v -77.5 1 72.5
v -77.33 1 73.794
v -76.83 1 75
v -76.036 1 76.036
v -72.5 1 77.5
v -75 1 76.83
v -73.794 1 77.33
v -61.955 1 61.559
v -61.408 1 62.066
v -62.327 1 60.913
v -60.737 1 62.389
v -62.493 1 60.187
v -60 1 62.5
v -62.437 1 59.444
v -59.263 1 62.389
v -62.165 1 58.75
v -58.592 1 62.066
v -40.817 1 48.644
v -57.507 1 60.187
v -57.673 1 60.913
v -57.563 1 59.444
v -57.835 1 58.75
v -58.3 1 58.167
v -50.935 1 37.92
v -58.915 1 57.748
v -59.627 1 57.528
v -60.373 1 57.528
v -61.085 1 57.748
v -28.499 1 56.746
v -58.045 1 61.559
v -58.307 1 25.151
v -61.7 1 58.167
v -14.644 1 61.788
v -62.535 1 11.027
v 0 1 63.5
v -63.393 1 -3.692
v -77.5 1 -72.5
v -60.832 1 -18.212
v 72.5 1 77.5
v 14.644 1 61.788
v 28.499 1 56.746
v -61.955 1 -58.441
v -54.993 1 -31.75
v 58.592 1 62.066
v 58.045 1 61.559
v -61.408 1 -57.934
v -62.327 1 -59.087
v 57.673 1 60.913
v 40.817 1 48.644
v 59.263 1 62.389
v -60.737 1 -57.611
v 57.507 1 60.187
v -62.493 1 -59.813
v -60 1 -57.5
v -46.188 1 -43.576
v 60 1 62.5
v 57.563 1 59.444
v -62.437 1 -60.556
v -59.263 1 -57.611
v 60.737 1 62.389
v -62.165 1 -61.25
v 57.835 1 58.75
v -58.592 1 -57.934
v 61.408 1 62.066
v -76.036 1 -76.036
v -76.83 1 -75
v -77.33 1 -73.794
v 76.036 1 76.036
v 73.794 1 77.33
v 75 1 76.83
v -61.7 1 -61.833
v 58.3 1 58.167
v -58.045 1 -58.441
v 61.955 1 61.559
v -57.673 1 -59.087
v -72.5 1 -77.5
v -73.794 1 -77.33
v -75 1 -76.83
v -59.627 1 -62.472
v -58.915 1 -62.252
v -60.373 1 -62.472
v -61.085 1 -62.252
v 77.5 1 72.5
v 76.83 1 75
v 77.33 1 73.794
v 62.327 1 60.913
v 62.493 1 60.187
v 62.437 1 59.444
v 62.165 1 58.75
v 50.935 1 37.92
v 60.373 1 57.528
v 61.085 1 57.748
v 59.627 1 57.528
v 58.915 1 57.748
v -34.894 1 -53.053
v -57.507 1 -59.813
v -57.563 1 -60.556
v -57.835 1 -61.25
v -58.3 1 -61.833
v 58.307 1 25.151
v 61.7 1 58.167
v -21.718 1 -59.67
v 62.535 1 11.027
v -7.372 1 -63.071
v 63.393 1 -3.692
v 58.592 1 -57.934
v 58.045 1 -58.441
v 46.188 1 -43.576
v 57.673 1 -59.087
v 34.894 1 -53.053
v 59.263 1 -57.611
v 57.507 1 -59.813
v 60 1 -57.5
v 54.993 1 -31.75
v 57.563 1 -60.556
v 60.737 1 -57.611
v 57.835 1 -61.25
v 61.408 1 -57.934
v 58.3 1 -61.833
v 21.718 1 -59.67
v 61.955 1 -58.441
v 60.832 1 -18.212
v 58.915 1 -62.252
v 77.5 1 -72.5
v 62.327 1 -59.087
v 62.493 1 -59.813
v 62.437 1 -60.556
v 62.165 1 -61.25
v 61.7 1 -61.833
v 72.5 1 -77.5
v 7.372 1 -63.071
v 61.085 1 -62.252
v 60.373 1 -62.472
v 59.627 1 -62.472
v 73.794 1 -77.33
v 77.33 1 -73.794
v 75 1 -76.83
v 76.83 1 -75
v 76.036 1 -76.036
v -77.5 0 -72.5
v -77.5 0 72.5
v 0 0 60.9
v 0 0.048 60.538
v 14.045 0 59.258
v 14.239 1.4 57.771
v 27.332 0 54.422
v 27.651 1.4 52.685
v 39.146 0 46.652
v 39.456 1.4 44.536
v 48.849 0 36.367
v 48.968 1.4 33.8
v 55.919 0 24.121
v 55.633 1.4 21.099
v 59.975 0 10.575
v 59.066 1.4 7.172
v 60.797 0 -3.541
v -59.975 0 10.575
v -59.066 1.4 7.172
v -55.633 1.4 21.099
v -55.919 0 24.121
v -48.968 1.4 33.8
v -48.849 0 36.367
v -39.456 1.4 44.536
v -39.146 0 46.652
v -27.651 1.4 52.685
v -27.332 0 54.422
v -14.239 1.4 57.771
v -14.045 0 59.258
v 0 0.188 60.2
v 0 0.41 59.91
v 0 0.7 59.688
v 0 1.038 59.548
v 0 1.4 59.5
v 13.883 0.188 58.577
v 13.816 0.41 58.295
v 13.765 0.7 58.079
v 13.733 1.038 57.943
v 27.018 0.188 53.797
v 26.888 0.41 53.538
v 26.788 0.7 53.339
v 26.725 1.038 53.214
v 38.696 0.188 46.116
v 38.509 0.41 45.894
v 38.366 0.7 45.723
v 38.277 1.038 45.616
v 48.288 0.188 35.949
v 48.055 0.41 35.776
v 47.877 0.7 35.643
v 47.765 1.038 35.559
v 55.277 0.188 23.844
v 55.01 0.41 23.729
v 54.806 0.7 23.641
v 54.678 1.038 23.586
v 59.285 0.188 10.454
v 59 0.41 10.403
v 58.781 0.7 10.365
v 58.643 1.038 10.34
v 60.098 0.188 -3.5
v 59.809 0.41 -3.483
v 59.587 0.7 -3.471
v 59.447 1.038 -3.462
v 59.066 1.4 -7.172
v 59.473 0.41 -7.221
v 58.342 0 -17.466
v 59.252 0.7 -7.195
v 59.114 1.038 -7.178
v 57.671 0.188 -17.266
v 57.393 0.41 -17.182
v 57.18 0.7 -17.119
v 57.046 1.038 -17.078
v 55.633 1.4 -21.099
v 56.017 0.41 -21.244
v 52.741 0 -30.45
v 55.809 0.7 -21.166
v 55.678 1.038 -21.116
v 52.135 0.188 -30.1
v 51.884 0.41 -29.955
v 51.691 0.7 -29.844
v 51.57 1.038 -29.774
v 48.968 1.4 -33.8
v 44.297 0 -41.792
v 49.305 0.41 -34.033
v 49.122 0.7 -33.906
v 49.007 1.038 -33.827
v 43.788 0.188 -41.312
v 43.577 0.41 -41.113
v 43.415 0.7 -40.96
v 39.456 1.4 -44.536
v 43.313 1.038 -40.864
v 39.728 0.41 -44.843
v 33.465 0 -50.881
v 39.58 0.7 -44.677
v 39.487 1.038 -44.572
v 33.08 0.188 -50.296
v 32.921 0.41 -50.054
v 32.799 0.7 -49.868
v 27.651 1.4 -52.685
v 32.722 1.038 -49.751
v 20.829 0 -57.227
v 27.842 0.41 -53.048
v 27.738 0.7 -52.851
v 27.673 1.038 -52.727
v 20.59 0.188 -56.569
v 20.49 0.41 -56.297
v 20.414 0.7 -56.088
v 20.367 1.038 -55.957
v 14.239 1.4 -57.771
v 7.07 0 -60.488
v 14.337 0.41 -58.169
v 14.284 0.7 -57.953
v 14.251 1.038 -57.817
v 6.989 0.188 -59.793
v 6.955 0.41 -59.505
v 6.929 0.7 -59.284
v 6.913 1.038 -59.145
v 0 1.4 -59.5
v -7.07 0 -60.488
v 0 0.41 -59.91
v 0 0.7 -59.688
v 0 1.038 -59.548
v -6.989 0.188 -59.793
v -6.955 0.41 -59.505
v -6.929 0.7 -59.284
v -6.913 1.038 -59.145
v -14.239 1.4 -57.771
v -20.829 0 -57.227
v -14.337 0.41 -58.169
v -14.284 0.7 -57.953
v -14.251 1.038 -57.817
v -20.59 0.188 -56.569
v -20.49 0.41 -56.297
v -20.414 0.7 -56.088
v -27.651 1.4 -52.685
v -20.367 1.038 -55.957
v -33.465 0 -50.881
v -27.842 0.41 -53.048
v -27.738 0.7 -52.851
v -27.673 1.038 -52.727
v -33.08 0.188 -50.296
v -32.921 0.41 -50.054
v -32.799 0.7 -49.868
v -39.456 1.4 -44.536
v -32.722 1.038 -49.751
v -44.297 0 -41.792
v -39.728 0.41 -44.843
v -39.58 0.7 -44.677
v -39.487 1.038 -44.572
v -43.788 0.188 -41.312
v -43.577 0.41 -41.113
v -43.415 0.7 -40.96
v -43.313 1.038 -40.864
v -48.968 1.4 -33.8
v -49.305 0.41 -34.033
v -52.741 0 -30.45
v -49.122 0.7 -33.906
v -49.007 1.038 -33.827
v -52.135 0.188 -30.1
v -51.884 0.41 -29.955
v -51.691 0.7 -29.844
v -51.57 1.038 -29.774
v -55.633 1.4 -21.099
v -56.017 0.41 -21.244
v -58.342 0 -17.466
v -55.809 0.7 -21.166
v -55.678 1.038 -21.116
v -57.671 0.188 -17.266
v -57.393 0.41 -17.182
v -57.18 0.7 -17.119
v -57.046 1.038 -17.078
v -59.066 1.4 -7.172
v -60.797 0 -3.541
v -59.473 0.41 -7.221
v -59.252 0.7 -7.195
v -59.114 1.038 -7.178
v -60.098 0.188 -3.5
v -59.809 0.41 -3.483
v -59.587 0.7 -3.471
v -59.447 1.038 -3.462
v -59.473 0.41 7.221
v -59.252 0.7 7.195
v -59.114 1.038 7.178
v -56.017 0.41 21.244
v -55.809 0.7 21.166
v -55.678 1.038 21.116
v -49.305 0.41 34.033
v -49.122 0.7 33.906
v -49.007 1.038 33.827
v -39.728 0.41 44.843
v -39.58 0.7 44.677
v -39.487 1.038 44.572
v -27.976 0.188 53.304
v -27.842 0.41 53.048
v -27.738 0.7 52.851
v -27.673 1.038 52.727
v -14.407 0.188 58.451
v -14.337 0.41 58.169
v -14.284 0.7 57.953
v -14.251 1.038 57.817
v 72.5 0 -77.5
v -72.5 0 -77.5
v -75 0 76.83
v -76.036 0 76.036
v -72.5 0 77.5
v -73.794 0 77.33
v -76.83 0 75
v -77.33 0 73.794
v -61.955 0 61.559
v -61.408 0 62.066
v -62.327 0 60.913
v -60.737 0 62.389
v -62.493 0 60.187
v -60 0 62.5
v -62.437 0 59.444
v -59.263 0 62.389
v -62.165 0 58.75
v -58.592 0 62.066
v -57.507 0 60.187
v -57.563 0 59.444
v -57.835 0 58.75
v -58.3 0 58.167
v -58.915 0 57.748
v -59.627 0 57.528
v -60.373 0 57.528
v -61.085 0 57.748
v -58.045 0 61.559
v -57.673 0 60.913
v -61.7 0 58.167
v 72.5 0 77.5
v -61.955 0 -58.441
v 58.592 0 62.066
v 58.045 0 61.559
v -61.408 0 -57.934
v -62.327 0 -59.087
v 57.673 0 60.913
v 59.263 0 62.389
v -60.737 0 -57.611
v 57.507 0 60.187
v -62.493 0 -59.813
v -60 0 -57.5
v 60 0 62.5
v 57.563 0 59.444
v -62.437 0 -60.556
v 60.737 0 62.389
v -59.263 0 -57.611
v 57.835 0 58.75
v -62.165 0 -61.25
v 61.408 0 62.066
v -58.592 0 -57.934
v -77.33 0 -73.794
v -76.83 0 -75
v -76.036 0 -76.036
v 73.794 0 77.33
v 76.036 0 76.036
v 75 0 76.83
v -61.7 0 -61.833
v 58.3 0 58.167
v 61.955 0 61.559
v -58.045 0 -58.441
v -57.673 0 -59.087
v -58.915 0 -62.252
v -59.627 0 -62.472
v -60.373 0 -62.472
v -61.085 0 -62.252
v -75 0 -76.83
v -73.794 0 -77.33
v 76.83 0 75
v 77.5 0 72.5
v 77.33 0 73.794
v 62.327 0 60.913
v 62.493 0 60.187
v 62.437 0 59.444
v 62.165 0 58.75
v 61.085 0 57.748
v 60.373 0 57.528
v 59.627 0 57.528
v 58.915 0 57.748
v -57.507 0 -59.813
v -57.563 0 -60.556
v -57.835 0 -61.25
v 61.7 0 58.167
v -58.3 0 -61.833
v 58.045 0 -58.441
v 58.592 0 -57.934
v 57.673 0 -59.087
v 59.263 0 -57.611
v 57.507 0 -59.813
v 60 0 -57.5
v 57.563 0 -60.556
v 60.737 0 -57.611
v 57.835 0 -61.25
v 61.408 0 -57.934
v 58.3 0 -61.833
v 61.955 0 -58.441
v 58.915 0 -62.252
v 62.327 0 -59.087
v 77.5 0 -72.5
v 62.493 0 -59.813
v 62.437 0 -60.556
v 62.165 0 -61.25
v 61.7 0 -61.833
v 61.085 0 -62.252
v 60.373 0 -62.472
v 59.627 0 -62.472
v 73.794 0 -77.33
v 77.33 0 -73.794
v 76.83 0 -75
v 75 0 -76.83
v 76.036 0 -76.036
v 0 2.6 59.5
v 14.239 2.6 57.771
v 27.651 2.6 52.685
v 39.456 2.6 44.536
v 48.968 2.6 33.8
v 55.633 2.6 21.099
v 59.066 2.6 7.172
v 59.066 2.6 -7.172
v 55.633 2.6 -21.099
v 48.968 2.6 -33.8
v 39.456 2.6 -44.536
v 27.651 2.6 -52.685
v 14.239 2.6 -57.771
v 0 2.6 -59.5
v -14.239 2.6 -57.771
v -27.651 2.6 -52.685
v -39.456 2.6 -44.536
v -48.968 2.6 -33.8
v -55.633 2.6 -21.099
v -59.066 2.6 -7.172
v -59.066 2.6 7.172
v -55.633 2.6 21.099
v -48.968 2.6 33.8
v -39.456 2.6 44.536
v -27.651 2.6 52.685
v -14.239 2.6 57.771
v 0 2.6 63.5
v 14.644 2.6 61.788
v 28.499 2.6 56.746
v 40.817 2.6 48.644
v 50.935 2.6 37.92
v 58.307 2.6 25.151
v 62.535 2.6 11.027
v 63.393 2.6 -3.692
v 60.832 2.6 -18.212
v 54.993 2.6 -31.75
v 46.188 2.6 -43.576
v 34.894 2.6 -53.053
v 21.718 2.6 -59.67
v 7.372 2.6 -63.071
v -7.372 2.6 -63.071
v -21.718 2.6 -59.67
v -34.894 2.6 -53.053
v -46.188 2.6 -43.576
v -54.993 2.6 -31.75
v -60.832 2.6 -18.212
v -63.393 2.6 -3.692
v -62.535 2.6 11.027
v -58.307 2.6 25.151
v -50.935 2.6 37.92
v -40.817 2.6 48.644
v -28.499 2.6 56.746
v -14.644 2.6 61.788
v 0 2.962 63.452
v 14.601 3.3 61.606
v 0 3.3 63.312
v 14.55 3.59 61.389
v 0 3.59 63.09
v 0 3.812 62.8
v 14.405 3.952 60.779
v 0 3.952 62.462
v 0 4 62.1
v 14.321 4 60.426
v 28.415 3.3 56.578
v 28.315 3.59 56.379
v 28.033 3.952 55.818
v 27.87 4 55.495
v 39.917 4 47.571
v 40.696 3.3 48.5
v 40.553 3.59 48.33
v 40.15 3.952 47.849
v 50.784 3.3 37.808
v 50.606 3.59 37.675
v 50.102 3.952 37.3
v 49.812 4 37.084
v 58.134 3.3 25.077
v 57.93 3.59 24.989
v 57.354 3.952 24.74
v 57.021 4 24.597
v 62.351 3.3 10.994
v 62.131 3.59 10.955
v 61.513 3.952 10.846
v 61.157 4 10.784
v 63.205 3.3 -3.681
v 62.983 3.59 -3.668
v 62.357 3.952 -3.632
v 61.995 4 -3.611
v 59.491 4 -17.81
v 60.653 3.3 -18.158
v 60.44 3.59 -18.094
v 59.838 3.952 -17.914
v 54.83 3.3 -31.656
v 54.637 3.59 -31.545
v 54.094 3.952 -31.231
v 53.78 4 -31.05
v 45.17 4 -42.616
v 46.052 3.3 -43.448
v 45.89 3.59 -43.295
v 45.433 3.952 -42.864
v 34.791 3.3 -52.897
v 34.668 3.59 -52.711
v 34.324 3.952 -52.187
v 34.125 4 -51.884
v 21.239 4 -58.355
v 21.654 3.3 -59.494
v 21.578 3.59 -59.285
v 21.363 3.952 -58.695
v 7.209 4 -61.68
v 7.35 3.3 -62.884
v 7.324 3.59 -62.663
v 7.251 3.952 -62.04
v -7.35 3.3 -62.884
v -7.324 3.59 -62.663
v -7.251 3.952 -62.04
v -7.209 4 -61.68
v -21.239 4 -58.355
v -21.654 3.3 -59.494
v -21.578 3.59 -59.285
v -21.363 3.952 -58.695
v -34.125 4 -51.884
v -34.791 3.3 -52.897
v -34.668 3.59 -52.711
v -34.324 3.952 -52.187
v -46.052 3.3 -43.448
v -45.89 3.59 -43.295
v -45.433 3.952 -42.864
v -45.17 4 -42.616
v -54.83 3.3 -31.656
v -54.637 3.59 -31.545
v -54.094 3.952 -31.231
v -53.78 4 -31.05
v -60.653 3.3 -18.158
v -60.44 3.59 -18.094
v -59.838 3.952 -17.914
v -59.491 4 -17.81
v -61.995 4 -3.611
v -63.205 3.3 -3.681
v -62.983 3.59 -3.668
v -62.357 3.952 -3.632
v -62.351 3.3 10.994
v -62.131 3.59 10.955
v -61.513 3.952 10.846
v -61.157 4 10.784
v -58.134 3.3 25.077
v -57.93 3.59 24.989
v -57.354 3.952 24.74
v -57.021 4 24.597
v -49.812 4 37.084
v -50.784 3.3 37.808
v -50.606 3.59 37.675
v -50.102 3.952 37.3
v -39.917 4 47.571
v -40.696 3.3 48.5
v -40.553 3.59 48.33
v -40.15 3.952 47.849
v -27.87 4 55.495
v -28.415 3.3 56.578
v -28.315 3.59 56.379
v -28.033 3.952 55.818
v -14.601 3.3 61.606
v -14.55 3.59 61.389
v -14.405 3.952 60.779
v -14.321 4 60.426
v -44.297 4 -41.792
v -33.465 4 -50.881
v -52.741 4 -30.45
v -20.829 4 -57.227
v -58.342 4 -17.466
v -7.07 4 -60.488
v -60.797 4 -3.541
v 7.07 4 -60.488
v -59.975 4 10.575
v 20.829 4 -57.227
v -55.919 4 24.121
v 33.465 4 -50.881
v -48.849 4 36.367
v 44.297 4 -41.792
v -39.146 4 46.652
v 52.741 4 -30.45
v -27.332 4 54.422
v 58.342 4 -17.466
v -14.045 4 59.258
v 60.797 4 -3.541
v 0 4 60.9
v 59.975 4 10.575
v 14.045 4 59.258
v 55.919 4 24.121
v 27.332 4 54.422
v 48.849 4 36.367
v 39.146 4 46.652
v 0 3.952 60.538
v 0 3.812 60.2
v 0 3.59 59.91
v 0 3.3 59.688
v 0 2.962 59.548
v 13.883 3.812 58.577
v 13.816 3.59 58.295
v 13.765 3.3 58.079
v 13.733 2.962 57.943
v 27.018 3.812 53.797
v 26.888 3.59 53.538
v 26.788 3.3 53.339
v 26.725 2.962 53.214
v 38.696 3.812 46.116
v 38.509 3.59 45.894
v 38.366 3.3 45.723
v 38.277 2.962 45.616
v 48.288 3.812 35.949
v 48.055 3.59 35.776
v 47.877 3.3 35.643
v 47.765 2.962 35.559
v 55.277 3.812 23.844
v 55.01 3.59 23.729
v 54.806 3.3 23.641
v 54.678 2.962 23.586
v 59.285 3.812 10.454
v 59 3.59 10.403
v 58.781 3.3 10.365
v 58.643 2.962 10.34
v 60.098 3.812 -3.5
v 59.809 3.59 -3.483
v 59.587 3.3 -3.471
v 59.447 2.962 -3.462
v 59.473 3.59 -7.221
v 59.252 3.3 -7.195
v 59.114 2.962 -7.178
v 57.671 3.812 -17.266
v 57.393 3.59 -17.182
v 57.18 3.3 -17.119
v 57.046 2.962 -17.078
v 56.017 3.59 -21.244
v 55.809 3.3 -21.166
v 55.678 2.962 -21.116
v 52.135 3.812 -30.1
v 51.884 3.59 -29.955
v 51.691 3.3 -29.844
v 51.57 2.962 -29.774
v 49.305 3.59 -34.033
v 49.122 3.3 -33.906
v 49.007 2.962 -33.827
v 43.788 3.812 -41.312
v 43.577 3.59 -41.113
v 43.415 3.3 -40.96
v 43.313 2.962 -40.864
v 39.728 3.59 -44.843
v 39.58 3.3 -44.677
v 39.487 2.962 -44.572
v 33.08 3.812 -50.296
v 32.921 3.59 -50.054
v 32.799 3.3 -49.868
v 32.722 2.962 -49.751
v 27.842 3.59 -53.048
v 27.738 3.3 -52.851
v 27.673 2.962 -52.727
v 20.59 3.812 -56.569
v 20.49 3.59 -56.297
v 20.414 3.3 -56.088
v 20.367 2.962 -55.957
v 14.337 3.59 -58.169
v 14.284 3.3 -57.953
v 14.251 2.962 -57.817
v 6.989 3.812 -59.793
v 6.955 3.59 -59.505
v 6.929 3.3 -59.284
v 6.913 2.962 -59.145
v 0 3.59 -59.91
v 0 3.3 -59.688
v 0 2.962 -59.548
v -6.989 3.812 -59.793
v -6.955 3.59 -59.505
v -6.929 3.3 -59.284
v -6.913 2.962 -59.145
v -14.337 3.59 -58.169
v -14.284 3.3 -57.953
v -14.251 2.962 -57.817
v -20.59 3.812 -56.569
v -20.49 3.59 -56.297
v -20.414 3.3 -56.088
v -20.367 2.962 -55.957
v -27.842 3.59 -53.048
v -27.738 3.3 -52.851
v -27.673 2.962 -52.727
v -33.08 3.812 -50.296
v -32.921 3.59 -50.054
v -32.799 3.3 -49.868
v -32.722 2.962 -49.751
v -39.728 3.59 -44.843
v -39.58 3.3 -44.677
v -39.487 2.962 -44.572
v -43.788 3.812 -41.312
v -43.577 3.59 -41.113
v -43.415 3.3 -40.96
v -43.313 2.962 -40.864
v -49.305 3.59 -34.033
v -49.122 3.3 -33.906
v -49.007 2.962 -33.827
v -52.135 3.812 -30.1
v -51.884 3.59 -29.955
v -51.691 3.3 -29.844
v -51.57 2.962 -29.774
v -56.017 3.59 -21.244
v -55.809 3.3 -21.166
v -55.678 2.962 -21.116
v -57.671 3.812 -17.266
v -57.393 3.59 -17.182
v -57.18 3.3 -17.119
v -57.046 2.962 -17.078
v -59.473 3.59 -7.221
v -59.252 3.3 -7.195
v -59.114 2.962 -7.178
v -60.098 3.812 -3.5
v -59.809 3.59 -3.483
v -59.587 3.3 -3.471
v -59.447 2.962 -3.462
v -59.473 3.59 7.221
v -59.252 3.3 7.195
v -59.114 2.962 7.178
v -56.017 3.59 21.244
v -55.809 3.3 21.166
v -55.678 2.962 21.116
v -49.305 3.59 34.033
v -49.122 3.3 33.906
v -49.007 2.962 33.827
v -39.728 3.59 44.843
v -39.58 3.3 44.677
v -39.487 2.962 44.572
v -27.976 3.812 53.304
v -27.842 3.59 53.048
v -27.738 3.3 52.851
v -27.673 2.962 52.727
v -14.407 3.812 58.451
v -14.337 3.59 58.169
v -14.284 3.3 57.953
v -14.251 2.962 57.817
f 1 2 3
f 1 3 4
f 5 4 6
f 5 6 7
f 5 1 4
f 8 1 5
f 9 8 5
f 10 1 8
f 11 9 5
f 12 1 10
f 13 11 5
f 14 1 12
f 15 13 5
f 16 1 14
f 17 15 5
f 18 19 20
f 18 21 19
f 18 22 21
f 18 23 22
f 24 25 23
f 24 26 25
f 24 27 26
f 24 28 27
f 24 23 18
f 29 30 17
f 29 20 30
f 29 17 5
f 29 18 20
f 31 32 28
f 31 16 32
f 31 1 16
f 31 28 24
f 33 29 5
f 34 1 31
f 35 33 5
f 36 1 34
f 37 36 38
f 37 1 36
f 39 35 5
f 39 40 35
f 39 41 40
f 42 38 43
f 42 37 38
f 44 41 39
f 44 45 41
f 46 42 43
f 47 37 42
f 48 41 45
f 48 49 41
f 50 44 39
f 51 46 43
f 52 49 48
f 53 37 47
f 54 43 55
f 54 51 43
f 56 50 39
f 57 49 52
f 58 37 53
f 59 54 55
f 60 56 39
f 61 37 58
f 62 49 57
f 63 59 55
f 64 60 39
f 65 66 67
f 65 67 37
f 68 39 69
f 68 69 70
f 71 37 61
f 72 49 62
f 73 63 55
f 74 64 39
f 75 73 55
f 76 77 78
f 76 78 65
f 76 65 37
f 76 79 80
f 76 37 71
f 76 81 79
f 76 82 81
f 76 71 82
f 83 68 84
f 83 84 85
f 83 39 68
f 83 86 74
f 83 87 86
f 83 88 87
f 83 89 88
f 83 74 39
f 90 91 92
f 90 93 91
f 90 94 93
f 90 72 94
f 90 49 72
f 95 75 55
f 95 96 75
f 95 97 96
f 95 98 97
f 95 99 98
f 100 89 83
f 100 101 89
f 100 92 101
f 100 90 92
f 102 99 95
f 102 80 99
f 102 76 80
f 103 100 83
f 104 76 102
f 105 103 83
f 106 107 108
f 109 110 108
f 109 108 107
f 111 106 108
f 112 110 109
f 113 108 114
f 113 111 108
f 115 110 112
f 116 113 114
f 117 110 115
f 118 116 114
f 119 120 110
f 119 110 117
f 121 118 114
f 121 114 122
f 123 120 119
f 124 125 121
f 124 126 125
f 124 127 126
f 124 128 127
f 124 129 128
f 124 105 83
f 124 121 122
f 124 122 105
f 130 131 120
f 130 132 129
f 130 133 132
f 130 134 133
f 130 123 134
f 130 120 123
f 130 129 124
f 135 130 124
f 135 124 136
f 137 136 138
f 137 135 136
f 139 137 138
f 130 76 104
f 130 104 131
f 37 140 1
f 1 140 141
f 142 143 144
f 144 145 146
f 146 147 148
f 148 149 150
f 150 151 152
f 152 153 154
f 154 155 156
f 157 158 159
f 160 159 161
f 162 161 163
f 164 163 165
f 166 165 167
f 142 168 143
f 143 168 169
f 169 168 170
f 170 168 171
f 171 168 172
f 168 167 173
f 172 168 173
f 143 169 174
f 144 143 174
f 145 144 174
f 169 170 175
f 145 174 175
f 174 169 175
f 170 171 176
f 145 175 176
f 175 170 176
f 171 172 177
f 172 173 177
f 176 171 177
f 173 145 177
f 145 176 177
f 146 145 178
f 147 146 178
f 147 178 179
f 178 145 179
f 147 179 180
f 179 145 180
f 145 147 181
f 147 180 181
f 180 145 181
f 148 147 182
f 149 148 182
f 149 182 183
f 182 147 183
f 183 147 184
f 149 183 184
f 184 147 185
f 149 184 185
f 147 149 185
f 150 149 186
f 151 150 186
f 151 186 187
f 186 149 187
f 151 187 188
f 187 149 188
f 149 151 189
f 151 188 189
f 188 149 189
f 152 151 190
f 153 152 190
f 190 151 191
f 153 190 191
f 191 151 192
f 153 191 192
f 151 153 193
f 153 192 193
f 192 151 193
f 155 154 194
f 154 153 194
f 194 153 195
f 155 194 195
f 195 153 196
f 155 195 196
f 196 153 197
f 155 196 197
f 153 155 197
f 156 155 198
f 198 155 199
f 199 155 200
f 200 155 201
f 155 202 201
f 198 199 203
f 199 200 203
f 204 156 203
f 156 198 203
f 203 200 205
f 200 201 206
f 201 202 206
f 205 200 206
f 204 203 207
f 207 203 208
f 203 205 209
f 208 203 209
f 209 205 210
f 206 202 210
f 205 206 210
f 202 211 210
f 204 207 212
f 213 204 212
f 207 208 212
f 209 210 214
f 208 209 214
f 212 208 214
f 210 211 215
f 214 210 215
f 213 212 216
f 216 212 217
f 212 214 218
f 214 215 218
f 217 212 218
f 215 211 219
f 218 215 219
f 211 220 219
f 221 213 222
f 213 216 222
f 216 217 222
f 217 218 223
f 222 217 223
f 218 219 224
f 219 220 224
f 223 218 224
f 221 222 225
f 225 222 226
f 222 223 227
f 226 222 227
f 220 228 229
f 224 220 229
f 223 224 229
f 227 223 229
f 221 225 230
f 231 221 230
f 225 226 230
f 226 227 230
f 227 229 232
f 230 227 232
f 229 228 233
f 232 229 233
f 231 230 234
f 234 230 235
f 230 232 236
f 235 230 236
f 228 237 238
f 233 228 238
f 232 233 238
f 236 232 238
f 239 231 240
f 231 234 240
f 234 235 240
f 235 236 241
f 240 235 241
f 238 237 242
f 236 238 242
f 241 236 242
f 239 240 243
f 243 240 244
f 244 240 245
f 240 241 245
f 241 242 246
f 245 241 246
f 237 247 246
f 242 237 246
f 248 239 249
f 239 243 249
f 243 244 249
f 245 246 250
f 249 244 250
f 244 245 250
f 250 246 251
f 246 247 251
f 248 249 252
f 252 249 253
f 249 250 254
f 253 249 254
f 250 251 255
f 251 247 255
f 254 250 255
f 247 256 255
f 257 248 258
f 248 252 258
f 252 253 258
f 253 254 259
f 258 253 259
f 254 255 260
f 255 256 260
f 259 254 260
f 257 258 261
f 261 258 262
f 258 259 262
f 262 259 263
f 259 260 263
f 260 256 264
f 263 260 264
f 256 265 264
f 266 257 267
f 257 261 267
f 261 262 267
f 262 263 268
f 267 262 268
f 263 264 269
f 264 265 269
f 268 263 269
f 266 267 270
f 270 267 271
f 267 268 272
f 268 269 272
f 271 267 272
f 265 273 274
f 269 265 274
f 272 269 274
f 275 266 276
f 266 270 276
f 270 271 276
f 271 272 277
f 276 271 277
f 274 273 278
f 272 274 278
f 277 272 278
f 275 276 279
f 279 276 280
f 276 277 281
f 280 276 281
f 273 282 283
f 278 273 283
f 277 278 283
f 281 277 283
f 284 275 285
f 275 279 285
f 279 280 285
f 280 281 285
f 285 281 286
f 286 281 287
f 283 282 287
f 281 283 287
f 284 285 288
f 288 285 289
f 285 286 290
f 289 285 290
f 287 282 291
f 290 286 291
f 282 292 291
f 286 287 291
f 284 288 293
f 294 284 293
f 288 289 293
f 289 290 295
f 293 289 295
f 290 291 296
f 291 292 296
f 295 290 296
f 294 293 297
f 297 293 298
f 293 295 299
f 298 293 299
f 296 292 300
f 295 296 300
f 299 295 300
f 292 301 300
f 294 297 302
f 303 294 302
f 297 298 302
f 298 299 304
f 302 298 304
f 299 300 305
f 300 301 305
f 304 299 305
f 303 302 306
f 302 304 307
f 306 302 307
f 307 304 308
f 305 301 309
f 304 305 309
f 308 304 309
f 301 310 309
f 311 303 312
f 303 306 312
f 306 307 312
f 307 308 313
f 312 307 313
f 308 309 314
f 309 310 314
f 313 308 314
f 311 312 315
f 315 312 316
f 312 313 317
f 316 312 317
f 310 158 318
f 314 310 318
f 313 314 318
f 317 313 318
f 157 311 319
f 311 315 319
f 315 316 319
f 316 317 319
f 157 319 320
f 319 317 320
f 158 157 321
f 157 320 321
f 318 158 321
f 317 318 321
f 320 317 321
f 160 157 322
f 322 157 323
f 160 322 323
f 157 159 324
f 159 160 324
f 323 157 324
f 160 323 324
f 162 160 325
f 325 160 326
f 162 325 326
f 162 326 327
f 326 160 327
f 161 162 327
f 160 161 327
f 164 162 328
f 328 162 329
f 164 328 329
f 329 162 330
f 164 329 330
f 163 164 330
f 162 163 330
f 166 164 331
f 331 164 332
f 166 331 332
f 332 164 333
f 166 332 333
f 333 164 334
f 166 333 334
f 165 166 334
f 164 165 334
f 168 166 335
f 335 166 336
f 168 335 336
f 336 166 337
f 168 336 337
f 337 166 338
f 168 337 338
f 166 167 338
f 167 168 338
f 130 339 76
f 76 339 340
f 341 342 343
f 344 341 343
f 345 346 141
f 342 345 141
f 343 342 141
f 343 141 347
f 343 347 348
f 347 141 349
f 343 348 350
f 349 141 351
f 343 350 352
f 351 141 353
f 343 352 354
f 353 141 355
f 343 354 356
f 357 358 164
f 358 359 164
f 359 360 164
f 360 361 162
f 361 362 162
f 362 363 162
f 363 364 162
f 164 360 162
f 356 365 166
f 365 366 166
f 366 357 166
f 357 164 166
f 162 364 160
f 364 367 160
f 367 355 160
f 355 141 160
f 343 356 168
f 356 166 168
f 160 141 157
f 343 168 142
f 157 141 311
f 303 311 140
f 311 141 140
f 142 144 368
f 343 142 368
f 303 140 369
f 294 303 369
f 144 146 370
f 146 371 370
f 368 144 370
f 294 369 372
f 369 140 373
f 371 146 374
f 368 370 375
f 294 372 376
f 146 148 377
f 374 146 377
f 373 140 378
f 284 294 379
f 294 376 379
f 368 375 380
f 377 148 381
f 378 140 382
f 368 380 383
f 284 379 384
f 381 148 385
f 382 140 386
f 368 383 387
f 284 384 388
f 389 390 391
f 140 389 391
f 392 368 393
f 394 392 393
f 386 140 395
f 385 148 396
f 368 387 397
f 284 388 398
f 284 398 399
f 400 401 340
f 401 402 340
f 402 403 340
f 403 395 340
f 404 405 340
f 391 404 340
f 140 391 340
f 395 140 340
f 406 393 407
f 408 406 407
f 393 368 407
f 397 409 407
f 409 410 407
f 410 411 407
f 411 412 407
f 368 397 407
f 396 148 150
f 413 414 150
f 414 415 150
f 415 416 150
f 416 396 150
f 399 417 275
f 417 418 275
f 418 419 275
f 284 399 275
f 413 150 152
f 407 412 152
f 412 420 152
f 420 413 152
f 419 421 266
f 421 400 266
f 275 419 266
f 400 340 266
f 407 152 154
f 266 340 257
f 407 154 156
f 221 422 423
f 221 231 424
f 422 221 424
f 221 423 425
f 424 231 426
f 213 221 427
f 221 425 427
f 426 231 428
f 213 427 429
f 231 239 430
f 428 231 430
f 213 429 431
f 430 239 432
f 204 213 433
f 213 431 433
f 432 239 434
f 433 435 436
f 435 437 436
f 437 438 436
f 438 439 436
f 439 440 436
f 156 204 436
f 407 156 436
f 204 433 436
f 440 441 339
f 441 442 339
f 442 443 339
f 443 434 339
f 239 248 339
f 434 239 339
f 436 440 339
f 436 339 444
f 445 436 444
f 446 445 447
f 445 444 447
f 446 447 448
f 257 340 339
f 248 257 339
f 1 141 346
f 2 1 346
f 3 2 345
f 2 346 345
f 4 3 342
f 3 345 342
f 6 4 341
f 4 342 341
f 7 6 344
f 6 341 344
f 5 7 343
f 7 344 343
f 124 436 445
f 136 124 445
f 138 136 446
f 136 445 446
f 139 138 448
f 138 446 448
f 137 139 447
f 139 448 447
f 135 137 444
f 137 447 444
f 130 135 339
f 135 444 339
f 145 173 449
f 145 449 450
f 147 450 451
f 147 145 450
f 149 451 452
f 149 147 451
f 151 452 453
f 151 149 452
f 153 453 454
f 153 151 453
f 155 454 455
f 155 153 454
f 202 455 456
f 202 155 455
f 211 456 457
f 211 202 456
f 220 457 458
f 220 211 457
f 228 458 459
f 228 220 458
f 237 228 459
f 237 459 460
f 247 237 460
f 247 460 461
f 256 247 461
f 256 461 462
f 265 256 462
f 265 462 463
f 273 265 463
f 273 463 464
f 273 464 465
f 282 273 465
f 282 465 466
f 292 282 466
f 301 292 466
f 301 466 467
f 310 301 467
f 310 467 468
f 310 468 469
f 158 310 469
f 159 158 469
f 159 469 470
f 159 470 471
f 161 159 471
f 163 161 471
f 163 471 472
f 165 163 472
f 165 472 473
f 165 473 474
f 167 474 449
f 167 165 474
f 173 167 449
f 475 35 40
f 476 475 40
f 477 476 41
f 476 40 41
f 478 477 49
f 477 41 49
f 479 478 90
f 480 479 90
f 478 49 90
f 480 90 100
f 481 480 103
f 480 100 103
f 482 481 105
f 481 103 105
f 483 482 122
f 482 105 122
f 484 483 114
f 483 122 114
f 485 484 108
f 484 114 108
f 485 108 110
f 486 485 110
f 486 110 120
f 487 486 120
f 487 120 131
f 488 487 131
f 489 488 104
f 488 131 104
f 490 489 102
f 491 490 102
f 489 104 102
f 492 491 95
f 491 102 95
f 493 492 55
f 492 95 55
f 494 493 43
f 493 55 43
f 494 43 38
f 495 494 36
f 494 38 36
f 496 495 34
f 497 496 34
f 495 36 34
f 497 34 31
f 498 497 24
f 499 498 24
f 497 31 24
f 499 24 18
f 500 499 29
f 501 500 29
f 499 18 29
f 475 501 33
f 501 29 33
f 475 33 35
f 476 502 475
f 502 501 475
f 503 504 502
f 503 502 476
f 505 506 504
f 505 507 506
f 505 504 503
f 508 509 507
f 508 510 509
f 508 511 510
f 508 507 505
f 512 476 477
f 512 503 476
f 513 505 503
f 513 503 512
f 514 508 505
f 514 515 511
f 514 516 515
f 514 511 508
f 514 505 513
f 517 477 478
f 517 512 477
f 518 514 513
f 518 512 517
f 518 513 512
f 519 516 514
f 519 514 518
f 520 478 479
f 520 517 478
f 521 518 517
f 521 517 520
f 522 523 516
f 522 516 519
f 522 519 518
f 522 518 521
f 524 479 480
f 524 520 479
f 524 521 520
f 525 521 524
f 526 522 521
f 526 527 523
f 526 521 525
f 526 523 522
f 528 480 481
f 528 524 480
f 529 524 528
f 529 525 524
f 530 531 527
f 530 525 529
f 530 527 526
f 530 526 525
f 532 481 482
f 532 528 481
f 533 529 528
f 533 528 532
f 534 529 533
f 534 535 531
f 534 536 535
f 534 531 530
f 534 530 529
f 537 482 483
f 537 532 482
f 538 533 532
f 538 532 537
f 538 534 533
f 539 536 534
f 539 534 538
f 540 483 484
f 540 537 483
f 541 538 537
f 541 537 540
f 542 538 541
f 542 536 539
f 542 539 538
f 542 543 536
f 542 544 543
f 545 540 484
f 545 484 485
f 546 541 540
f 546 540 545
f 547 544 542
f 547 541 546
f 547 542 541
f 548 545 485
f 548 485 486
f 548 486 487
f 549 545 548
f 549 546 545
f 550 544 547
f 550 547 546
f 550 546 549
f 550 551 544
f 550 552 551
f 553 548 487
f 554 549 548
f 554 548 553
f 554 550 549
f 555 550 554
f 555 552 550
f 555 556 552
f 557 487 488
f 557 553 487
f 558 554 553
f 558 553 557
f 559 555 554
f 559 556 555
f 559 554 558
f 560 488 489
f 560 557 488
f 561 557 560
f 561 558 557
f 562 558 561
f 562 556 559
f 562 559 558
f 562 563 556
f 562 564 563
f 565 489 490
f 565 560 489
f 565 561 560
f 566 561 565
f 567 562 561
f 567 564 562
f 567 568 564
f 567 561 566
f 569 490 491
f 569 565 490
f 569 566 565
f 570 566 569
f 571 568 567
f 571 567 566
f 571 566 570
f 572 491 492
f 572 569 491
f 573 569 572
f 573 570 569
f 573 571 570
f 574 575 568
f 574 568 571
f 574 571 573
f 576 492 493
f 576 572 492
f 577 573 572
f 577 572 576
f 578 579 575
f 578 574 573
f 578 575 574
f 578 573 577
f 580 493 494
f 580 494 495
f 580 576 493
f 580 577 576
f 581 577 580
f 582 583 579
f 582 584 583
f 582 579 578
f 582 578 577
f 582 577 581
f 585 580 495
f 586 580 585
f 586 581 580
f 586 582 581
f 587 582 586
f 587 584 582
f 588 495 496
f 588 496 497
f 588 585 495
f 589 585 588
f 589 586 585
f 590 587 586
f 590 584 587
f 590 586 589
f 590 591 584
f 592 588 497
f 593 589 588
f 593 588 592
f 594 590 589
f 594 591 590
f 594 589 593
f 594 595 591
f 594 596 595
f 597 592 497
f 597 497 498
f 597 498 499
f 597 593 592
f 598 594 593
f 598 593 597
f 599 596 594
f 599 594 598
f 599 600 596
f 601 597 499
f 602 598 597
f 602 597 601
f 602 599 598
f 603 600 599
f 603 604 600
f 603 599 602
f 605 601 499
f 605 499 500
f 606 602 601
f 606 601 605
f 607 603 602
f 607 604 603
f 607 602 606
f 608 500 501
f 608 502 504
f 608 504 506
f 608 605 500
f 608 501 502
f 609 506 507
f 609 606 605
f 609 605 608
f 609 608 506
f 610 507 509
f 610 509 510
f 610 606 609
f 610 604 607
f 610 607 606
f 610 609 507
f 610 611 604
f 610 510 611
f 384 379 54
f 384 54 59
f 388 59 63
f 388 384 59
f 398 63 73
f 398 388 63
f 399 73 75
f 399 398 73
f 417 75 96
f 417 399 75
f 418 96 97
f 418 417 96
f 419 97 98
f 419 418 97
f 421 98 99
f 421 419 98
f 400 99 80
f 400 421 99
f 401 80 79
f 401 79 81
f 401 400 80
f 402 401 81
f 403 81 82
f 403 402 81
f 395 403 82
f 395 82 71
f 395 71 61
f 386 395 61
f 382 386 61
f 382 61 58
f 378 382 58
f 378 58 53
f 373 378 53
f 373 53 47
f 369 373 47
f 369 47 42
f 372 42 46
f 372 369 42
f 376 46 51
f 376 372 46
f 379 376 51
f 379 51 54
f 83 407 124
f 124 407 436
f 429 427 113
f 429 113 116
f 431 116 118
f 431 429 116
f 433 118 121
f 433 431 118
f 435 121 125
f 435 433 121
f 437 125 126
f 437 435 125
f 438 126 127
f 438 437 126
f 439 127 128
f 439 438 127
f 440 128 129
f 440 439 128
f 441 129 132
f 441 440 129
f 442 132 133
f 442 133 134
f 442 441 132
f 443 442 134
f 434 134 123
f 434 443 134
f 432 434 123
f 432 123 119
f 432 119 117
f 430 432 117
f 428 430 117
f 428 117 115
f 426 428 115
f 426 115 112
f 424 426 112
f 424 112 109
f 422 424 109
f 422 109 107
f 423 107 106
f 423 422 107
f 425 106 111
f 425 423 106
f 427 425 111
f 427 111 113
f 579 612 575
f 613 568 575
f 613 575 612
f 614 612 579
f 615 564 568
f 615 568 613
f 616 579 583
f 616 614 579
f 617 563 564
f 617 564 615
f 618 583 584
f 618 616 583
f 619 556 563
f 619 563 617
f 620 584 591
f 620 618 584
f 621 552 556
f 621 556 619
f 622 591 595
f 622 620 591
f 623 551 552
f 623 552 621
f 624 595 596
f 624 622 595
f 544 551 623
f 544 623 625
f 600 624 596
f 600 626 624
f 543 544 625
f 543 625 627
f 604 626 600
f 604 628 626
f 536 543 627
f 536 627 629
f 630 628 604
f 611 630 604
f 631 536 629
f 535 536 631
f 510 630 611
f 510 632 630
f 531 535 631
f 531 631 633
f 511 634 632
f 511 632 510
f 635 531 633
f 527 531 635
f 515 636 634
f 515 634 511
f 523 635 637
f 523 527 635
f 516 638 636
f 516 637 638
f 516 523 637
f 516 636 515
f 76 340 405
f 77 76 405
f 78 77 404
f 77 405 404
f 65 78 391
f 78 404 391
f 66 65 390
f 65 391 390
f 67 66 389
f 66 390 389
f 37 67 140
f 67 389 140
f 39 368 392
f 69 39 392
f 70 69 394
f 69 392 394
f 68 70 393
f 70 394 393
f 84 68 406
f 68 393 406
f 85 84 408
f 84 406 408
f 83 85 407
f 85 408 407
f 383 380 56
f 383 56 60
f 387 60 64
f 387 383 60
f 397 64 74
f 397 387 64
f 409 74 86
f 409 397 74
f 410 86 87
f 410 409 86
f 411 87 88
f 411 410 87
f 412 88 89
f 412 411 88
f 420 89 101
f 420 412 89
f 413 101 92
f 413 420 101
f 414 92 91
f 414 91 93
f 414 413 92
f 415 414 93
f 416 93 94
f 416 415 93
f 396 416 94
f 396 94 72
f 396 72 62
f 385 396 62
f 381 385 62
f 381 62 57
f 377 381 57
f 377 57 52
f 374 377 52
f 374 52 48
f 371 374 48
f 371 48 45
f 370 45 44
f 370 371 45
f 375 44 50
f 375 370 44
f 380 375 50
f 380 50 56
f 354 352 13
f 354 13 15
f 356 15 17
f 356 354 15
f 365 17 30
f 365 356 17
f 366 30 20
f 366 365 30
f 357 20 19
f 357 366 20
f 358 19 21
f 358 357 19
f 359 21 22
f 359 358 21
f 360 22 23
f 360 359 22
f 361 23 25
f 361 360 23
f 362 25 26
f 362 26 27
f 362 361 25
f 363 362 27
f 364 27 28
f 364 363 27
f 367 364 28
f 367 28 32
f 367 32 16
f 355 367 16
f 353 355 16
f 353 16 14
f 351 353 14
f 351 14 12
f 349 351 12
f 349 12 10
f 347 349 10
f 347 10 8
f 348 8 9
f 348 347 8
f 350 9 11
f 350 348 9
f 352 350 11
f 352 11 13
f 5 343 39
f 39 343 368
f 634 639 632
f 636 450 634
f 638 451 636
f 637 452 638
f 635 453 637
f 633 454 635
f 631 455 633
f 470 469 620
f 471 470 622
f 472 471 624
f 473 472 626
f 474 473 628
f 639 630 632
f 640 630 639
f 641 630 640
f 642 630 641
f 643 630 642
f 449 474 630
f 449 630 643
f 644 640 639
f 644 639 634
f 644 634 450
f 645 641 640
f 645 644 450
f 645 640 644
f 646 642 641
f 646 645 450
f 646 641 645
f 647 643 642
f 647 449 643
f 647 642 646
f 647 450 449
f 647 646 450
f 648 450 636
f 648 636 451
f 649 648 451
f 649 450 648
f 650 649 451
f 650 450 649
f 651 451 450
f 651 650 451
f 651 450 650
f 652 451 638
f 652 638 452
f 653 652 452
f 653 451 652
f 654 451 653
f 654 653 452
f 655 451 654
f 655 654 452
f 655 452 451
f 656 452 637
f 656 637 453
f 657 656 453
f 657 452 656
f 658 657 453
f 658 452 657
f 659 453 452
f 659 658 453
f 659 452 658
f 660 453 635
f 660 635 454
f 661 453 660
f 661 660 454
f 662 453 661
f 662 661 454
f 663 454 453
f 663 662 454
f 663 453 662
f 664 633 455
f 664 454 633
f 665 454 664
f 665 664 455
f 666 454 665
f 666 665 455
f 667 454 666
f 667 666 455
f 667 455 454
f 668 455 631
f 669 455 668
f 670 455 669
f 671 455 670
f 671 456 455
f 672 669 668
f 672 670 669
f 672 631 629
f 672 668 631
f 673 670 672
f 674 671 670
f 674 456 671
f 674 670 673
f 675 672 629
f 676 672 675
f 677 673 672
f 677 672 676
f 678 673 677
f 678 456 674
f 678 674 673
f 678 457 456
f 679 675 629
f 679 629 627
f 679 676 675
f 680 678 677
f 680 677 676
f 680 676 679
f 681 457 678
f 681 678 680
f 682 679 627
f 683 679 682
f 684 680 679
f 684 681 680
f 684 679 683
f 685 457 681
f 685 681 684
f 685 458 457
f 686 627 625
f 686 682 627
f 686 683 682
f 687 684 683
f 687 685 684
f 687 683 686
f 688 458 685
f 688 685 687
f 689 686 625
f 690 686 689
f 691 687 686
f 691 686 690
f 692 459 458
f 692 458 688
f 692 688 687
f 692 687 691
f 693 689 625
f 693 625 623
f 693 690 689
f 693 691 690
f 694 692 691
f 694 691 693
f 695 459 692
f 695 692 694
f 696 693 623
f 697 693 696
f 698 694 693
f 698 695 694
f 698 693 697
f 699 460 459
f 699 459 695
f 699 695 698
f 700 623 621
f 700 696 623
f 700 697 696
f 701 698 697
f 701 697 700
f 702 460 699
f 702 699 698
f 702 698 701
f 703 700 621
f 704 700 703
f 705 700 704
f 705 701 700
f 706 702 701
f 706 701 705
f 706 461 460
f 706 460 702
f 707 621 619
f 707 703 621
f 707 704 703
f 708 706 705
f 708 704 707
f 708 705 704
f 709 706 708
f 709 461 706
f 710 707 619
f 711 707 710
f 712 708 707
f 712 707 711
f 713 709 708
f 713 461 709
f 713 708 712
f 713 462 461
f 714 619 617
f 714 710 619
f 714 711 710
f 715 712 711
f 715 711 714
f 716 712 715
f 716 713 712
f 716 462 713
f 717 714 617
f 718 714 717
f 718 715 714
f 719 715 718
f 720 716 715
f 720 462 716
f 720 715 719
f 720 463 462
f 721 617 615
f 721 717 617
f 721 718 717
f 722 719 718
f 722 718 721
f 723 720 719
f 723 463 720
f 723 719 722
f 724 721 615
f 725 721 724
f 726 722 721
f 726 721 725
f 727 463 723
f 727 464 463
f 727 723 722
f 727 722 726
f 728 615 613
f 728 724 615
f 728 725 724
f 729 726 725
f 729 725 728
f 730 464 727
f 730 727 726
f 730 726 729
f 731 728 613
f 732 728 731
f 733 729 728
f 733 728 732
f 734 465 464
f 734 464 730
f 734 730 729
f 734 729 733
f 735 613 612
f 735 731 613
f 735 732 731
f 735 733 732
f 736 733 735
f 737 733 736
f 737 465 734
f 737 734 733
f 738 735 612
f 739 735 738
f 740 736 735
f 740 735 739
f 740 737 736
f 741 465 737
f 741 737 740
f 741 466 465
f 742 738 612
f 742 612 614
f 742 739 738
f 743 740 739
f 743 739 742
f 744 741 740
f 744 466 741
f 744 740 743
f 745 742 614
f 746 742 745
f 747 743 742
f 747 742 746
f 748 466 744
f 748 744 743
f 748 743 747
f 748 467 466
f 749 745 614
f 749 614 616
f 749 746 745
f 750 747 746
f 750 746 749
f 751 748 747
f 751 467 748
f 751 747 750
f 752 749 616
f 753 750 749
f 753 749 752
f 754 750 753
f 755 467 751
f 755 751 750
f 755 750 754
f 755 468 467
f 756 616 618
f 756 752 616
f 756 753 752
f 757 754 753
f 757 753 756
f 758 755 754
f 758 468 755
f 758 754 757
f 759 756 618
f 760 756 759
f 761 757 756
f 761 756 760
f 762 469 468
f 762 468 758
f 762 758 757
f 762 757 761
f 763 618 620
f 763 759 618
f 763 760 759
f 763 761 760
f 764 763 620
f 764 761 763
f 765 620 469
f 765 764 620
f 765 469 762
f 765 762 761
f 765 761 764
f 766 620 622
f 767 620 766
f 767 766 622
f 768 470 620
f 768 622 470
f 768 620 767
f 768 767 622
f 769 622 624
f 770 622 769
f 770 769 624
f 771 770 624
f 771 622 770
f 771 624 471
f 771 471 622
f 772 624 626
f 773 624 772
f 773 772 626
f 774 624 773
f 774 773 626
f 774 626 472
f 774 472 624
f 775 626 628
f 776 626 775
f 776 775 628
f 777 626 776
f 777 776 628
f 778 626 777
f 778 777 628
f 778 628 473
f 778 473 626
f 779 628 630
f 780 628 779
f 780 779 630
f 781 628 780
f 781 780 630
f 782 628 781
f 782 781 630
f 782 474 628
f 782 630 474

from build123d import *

# Parameters (mm, degrees)
SKETCH1_R           = 59.5
SKETCH1_R_2         = 2.5
BOSS_EXTRUDE1_DEPTH = 1
SKETCH2_R           = 63.5
SKETCH2_R_2         = 59.5
BOSS_EXTRUDE2_DEPTH = 3
FILLET1_R           = 1.4
FILLET2_R           = 1.4


with BuildPart() as part:
    # Sketch1 → Boss-Extrude1 (new body)
    with BuildSketch(Plane(origin=(0, 0, 0), x_dir=(1, 0, 0), z_dir=(0, 1, 0))):
        with BuildLine():
            Line((-72.5, -77.5), (72.5, -77.5))
            ThreePointArc((72.5, -77.5), (76.035533906, -76.035533906), (77.5, -72.5))
            Line((77.5, -72.5), (77.5, 72.5))
            ThreePointArc((77.5, 72.5), (76.035533906, 76.035533906), (72.5, 77.5))
            Line((72.5, 77.5), (-72.5, 77.5))
            ThreePointArc((-72.5, 77.5), (-76.035533906, 76.035533906), (-77.5, 72.5))
            Line((-77.5, 72.5), (-77.5, -72.5))
            ThreePointArc((-77.5, -72.5), (-76.035533906, -76.035533906), (-72.5, -77.5))
        make_face()
        with Locations(Location((0, 0, 0), (0, 0, 270))):
            Circle(SKETCH1_R, mode=Mode.SUBTRACT)
        with Locations(Location((-60, 60, 0), (0, 0, 270))):
            Circle(SKETCH1_R_2, mode=Mode.SUBTRACT)
        with Locations(Location((60, 60, 0), (0, 0, 270))):
            Circle(SKETCH1_R_2, mode=Mode.SUBTRACT)
        with Locations(Location((60, -60, 0), (0, 0, 270))):
            Circle(SKETCH1_R_2, mode=Mode.SUBTRACT)
        with Locations(Location((-60, -60, 0), (0, 0, 270))):
            Circle(SKETCH1_R_2, mode=Mode.SUBTRACT)
    extrude(amount=BOSS_EXTRUDE1_DEPTH)

    # Sketch2 → Boss-Extrude2 (add)
    with BuildSketch(Plane(origin=(0, 1, 0), x_dir=(1, 0, 0), z_dir=(0, 1, 0))):
        with Locations(Location((0, 0, 0), (0, 0, 270))):
            Circle(SKETCH2_R)
        with Locations(Location((0, 0, 0), (0, 0, 270))):
            Circle(SKETCH2_R_2, mode=Mode.SUBTRACT)
    extrude(amount=BOSS_EXTRUDE2_DEPTH)

    # Fillet1
    fillet1_edges = [part.edges().sort_by_distance(p)[0] for p in [
        (0, 4, -63.5),
        (0, 4, -59.5),
    ]]
    fillet(fillet1_edges, radius=FILLET1_R)

    # Fillet2
    fillet2_edges = [part.edges().sort_by_distance(p)[0] for p in [
        (0, 0, -59.5),
    ]]
    fillet(fillet2_edges, radius=FILLET2_R)


solid = part.part
